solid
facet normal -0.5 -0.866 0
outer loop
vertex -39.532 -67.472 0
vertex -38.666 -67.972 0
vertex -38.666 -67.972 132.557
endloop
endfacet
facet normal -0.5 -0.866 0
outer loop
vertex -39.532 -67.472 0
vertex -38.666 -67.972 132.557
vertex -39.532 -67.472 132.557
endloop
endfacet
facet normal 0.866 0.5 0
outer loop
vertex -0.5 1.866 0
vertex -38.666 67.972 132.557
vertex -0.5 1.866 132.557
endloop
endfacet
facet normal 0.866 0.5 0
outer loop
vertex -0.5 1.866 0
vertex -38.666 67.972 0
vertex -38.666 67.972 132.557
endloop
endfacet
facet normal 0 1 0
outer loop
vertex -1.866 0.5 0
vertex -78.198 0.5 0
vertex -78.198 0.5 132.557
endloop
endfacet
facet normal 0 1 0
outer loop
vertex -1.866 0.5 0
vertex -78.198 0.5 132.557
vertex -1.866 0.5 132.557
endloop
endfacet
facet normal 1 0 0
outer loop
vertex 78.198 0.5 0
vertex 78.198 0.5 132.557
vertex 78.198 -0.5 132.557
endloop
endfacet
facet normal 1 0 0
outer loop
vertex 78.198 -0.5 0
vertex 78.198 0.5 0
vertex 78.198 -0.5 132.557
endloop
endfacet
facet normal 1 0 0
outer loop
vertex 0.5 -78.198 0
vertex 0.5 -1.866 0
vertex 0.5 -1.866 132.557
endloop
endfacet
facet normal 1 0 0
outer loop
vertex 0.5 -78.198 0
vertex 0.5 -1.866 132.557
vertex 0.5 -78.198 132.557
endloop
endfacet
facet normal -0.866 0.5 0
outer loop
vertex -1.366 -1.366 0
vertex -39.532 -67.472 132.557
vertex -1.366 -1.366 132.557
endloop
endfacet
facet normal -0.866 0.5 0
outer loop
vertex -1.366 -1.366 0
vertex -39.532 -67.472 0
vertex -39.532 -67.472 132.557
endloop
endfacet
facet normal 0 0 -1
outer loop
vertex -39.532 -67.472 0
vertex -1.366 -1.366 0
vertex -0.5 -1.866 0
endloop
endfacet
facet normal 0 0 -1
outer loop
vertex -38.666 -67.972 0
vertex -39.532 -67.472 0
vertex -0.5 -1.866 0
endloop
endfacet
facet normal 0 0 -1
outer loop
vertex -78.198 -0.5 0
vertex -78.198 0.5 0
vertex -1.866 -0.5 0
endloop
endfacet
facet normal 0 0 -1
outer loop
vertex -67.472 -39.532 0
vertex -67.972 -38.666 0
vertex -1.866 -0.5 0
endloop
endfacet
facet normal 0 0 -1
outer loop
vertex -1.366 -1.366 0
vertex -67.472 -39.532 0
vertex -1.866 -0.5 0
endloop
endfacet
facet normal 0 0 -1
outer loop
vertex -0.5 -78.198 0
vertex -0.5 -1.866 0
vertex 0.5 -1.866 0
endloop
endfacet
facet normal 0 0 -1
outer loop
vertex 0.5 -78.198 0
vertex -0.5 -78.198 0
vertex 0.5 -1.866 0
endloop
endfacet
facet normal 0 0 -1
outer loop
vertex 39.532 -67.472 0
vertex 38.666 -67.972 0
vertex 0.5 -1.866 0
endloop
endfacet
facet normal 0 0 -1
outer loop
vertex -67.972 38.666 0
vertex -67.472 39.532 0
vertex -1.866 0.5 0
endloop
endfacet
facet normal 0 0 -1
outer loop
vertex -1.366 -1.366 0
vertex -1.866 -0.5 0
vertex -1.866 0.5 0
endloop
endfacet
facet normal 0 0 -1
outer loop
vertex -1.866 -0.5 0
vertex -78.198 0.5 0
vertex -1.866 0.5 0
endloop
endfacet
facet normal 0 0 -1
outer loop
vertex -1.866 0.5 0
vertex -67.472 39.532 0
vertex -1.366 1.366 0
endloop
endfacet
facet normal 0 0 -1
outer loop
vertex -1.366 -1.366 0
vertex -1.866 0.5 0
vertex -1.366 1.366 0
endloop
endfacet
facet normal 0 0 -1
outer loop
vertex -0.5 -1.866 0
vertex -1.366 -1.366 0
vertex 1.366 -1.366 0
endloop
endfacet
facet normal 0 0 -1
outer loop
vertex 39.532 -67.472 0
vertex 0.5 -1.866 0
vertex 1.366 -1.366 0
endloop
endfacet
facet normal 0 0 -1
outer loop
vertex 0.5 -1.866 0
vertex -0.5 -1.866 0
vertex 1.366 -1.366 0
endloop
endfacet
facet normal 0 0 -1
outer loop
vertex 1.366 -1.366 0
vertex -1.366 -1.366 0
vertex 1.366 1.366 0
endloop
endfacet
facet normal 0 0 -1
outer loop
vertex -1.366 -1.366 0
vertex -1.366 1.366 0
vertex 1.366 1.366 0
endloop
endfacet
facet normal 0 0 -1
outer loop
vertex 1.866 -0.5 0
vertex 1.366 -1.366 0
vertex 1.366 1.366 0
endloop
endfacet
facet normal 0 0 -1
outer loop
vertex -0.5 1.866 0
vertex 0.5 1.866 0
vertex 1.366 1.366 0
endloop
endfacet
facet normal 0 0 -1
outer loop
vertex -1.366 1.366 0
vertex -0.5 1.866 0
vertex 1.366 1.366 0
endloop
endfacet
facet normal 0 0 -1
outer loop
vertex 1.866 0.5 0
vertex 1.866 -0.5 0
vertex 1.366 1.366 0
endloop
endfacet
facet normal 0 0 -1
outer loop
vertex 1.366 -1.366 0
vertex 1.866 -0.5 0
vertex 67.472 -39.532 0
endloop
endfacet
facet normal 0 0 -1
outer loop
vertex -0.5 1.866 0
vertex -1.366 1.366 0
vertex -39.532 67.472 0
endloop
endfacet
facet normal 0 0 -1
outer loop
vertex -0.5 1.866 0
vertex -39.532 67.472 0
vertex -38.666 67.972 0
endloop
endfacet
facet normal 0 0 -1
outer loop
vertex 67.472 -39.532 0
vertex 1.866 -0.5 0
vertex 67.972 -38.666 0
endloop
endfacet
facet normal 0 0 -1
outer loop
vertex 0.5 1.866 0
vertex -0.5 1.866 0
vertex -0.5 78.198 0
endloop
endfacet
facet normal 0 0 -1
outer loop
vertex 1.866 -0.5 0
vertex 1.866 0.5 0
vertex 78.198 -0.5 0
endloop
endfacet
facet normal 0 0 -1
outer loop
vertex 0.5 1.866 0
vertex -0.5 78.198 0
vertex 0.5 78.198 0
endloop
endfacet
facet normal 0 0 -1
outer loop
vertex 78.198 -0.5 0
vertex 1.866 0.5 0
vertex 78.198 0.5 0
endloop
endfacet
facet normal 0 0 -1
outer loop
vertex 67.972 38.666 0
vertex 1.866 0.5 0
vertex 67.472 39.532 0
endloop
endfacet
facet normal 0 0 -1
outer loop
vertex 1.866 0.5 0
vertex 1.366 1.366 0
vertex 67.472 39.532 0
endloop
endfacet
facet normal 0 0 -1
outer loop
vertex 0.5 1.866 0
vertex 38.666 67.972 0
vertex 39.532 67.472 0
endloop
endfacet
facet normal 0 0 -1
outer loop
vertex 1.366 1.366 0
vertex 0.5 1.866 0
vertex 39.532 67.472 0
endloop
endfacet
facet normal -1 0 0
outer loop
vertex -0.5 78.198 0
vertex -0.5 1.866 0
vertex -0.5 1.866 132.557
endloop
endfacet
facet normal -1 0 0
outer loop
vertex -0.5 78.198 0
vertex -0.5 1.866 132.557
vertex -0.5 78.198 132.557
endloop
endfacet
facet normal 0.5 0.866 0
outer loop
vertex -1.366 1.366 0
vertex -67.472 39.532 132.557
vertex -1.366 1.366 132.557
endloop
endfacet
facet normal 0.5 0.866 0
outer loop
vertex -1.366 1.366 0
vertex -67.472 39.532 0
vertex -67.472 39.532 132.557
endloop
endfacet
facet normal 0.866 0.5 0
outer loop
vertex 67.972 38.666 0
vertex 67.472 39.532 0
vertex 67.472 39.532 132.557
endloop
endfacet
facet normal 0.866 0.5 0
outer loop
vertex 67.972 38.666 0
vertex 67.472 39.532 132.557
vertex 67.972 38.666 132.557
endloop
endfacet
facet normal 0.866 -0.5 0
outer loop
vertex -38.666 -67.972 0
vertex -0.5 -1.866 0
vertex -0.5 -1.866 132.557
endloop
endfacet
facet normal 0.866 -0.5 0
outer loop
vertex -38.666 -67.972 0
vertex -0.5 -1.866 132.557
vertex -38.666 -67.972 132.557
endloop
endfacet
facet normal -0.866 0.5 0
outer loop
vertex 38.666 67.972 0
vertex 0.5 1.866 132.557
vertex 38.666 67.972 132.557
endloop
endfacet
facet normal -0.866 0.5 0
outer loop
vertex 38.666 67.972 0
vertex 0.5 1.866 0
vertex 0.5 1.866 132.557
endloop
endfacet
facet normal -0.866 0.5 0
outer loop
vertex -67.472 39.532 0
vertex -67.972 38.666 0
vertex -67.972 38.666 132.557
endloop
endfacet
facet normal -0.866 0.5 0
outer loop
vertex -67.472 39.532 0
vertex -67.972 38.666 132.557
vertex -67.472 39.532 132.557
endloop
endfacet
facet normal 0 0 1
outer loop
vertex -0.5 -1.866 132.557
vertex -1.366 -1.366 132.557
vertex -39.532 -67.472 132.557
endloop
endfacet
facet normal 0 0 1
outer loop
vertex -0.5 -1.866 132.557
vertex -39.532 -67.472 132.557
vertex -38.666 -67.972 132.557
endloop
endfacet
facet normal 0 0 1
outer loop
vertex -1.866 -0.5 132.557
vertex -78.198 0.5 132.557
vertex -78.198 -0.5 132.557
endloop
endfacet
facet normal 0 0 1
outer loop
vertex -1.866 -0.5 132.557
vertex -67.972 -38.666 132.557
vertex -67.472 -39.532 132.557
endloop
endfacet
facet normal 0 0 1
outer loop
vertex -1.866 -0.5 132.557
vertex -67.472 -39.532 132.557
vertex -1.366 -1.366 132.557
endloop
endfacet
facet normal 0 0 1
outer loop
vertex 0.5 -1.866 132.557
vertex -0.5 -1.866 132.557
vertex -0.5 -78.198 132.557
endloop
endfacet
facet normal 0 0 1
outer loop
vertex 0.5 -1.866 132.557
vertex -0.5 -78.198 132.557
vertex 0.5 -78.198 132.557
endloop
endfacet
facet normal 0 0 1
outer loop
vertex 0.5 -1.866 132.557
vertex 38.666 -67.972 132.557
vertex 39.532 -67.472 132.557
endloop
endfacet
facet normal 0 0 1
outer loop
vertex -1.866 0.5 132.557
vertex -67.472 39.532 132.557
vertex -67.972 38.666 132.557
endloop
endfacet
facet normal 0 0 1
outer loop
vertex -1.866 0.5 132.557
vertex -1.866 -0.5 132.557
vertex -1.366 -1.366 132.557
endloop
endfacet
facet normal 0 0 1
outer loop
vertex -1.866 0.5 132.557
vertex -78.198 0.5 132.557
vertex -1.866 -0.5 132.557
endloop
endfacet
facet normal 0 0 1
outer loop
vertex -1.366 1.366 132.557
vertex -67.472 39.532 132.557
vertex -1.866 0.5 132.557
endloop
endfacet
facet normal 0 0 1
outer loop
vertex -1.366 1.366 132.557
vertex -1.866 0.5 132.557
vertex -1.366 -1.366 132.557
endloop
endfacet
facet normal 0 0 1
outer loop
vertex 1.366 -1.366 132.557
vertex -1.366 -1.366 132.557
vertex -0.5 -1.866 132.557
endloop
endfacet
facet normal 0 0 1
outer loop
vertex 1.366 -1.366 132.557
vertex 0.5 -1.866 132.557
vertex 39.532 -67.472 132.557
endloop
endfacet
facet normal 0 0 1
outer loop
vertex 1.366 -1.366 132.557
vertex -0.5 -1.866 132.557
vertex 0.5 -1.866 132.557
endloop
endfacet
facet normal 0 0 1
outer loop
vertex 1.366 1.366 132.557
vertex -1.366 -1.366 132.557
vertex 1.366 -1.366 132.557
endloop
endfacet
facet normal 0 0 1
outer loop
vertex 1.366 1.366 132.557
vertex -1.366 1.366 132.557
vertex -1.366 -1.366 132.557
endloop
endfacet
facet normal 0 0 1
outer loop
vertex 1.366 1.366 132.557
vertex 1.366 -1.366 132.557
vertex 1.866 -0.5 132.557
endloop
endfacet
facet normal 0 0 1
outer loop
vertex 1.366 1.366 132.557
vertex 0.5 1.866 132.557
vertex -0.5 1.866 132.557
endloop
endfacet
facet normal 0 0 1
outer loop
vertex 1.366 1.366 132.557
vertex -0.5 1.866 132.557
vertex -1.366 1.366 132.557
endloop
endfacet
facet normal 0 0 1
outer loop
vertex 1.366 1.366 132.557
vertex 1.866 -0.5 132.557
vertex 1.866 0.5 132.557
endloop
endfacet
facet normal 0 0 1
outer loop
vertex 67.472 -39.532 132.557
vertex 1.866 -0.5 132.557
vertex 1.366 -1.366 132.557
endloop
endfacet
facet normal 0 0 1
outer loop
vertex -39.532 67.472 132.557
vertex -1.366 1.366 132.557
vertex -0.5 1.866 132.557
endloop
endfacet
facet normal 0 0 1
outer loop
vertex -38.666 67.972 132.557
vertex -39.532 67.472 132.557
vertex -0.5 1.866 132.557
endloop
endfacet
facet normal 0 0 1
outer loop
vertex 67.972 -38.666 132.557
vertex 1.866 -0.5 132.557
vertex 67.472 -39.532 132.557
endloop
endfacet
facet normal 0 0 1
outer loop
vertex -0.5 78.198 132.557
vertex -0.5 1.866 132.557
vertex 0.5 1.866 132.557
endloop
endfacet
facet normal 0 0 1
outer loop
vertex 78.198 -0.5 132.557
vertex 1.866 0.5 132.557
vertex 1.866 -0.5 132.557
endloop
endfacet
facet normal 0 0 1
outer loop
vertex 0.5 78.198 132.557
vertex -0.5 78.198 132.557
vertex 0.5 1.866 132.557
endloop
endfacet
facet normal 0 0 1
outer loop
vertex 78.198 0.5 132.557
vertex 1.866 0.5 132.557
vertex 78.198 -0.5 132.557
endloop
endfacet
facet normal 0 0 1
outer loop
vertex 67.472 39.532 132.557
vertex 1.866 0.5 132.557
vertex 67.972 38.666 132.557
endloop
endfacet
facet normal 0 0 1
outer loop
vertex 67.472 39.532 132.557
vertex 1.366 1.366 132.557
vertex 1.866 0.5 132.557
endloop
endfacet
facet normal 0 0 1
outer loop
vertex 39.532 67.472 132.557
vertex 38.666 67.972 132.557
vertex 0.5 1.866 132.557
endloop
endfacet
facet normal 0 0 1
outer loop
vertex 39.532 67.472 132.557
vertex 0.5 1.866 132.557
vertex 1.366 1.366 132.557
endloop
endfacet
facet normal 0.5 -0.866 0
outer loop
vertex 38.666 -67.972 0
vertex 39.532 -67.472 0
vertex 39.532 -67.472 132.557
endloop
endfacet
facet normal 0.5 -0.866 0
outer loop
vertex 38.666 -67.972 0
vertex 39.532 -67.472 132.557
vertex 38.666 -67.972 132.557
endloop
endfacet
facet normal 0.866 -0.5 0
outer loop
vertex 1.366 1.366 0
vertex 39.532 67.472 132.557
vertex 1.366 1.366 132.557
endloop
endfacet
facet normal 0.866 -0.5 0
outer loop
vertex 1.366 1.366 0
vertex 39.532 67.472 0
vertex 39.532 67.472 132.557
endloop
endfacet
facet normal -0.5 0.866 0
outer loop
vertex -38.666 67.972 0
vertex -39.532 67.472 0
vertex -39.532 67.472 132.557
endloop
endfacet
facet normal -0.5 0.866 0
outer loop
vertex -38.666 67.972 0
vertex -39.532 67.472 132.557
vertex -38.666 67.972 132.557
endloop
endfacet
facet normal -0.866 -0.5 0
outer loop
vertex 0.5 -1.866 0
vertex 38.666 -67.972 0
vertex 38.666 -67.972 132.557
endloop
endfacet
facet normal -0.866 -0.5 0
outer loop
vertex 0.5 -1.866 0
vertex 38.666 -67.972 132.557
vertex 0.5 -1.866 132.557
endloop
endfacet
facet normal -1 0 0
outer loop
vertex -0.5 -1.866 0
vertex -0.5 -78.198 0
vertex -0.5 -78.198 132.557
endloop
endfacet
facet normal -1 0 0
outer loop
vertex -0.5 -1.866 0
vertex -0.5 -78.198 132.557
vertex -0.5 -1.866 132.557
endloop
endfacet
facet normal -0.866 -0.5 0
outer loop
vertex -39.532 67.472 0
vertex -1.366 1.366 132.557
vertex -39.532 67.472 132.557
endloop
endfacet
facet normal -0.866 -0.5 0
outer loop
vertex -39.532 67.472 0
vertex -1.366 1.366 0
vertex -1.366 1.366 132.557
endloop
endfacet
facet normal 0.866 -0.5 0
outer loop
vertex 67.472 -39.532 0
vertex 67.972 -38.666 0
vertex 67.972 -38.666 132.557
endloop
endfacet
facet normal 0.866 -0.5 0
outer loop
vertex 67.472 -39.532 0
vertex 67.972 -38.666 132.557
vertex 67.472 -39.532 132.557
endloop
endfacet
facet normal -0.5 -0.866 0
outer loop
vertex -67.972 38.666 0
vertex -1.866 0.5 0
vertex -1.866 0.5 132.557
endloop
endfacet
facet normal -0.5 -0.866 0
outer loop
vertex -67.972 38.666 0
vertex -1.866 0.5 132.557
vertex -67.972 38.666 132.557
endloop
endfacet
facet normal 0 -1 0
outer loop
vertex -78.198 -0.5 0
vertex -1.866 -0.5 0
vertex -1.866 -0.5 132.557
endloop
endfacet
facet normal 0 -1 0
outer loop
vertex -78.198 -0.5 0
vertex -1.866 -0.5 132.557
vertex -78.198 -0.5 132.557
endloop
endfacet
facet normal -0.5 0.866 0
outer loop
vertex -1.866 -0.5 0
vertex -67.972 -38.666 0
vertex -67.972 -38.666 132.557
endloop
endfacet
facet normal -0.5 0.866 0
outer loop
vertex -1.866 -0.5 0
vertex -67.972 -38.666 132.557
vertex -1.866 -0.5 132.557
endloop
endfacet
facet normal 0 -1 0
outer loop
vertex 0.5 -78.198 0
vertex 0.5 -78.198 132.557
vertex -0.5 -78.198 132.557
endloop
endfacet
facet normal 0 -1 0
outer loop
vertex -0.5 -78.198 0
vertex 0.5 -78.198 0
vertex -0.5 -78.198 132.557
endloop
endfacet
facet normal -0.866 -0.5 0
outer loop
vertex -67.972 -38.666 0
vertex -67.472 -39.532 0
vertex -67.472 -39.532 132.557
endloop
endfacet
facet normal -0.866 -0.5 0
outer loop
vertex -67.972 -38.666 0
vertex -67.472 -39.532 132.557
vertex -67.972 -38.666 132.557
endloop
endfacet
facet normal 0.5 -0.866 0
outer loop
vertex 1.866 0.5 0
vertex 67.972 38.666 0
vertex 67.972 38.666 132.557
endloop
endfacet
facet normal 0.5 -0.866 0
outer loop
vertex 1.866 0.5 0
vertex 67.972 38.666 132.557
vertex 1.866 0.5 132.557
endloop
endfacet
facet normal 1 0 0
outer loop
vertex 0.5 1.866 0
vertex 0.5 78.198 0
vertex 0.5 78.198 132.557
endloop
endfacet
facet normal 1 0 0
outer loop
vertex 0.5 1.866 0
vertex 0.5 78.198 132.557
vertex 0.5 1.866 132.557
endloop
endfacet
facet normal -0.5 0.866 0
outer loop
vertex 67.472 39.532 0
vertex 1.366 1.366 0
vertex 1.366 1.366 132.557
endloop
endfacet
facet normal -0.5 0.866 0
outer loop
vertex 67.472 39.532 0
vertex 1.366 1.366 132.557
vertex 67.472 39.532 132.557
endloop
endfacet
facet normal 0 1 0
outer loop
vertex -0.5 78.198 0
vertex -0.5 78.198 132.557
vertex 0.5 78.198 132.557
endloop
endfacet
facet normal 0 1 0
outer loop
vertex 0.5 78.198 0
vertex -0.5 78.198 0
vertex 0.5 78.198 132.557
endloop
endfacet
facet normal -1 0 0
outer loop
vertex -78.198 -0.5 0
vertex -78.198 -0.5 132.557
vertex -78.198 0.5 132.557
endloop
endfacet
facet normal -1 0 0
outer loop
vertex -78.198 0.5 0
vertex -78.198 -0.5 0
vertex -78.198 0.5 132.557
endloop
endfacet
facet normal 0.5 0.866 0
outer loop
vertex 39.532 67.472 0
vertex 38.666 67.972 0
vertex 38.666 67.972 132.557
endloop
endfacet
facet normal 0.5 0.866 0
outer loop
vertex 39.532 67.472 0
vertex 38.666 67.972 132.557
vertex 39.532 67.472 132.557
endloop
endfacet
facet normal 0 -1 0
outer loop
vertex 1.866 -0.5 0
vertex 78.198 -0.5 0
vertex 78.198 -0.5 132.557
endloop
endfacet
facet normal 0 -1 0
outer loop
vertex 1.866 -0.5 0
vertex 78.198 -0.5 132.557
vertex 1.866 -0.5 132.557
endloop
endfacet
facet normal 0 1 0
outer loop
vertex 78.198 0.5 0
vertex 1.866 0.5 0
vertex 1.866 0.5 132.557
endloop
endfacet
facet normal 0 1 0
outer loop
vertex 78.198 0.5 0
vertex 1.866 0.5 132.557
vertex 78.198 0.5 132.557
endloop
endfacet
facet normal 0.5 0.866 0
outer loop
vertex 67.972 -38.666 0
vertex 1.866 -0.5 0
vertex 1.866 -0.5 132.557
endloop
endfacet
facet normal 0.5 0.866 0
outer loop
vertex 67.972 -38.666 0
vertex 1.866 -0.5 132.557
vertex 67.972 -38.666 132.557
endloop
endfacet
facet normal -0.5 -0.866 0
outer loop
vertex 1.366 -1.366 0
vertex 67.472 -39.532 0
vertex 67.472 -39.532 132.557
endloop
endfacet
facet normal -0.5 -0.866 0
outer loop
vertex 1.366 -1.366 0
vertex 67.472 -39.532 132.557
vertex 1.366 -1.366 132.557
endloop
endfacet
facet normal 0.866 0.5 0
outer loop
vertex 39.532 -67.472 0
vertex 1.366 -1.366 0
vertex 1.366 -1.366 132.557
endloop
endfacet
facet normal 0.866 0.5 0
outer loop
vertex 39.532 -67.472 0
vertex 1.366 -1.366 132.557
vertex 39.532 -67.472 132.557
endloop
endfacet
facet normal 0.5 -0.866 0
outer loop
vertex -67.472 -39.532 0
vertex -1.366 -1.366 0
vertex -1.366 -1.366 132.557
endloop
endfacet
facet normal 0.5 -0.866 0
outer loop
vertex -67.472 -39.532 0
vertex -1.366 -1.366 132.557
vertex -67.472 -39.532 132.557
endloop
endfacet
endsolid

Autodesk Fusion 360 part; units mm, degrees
sketch "Sketch1" plane through (0, 0, 0) normal (0, 0, 1) x (1, 0, 0)
  line L0 (-78.198, 0.5) -> (78.198, 0.5)
  line L1 (78.198, 0.5) -> (78.198, -0.5)
  line L2 (78.198, -0.5) -> (-78.198, -0.5)
  line L3 (-78.198, -0.5) -> (-78.198, 0.5)
  line L4 (-78.198, 0.5) -> (78.198, -0.5) construction
  line L5 (78.198, 0.5) -> (-78.198, -0.5) construction
  line L6 (-67.4715, -39.532) -> (-67.9715, -38.666)
  line L7 (-67.9715, -38.666) -> (67.9715, 38.666) construction
  line L8 (67.4715, 39.532) -> (67.9715, 38.666)
  line L9 (67.9715, 38.666) -> (-67.4715, -39.532)
  line L10 (-67.9715, -38.666) -> (67.4715, 39.532)
  line L11 (67.4715, 39.532) -> (-67.4715, -39.532) construction
  line L12 (-38.666, -67.9715) -> (-39.532, -67.4715)
  line L13 (-39.532, -67.4715) -> (39.532, 67.4715) construction
  line L14 (38.666, 67.9715) -> (39.532, 67.4715)
  line L15 (39.532, 67.4715) -> (-38.666, -67.9715)
  line L16 (-39.532, -67.4715) -> (38.666, 67.9715)
  line L17 (38.666, 67.9715) -> (-38.666, -67.9715) construction
  line L18 (0.5, -78.198) -> (-0.5, -78.198)
  line L19 (-0.5, -78.198) -> (0.5, 78.198) construction
  line L20 (-0.5, 78.198) -> (0.5, 78.198)
  line L21 (0.5, 78.198) -> (0.5, -78.198)
  line L22 (-0.5, -78.198) -> (-0.5, 78.198)
  line L23 (-0.5, 78.198) -> (0.5, -78.198) construction
  line L24 (39.532, -67.4715) -> (38.666, -67.9715)
  line L25 (38.666, -67.9715) -> (-38.666, 67.9715) construction
  line L26 (-39.532, 67.4715) -> (-38.666, 67.9715)
  line L27 (-38.666, 67.9715) -> (39.532, -67.4715)
  line L28 (38.666, -67.9715) -> (-39.532, 67.4715)
  line L29 (-39.532, 67.4715) -> (39.532, -67.4715) construction
  line L30 (67.9715, -38.666) -> (67.4715, -39.532)
  line L31 (67.4715, -39.532) -> (-67.4715, 39.532) construction
  line L32 (-67.9715, 38.666) -> (-67.4715, 39.532)
  line L33 (-67.4715, 39.532) -> (67.9715, -38.666)
  line L34 (67.4715, -39.532) -> (-67.9715, 38.666)
  line L35 (-67.9715, 38.666) -> (67.9715, -38.666) construction
  line L36 (78.198, 0.5) -> (78.198, -0.5)
  line L37 (78.198, -0.5) -> (-78.198, 0.5) construction
  line L38 (-78.198, -0.5) -> (-78.198, 0.5)
  line L39 (-78.198, 0.5) -> (78.198, 0.5)
  line L40 (78.198, -0.5) -> (-78.198, -0.5)
  line L41 (-78.198, -0.5) -> (78.198, 0.5) construction
  line L42 (67.4715, 39.532) -> (67.9715, 38.666)
  line L43 (67.9715, 38.666) -> (-67.9715, -38.666) construction
  line L44 (-67.4715, -39.532) -> (-67.9715, -38.666)
  line L45 (-67.9715, -38.666) -> (67.4715, 39.532)
  line L46 (67.9715, 38.666) -> (-67.4715, -39.532)
  line L47 (-67.4715, -39.532) -> (67.4715, 39.532) construction
  line L48 (38.666, 67.9715) -> (39.532, 67.4715)
  line L49 (39.532, 67.4715) -> (-39.532, -67.4715) construction
  line L50 (-38.666, -67.9715) -> (-39.532, -67.4715)
  line L51 (-39.532, -67.4715) -> (38.666, 67.9715)
  line L52 (39.532, 67.4715) -> (-38.666, -67.9715)
  line L53 (-38.666, -67.9715) -> (38.666, 67.9715) construction
  line L54 (-0.5, 78.198) -> (0.5, 78.198)
  line L55 (0.5, 78.198) -> (-0.5, -78.198) construction
  line L56 (0.5, -78.198) -> (-0.5, -78.198)
  line L57 (-0.5, -78.198) -> (-0.5, 78.198)
  line L58 (0.5, 78.198) -> (0.5, -78.198)
  line L59 (0.5, -78.198) -> (-0.5, 78.198) construction
  line L60 (-39.532, 67.4715) -> (-38.666, 67.9715)
  line L61 (-38.666, 67.9715) -> (38.666, -67.9715) construction
  line L62 (39.532, -67.4715) -> (38.666, -67.9715)
  line L63 (38.666, -67.9715) -> (-39.532, 67.4715)
  line L64 (-38.666, 67.9715) -> (39.532, -67.4715)
  line L65 (39.532, -67.4715) -> (-39.532, 67.4715) construction
  line L66 (-67.9715, 38.666) -> (-67.4715, 39.532)
  line L67 (-67.4715, 39.532) -> (67.4715, -39.532) construction
  line L68 (67.9715, -38.666) -> (67.4715, -39.532)
  line L69 (67.4715, -39.532) -> (-67.9715, 38.666)
  line L70 (-67.4715, 39.532) -> (67.9715, -38.666)
  line L71 (67.9715, -38.666) -> (-67.9715, 38.666) construction
  dimension "d1" = 1
  dimension "d3" = 360
extrude "Extrude1" add sketch "Sketch1" along normal blind 132.557
